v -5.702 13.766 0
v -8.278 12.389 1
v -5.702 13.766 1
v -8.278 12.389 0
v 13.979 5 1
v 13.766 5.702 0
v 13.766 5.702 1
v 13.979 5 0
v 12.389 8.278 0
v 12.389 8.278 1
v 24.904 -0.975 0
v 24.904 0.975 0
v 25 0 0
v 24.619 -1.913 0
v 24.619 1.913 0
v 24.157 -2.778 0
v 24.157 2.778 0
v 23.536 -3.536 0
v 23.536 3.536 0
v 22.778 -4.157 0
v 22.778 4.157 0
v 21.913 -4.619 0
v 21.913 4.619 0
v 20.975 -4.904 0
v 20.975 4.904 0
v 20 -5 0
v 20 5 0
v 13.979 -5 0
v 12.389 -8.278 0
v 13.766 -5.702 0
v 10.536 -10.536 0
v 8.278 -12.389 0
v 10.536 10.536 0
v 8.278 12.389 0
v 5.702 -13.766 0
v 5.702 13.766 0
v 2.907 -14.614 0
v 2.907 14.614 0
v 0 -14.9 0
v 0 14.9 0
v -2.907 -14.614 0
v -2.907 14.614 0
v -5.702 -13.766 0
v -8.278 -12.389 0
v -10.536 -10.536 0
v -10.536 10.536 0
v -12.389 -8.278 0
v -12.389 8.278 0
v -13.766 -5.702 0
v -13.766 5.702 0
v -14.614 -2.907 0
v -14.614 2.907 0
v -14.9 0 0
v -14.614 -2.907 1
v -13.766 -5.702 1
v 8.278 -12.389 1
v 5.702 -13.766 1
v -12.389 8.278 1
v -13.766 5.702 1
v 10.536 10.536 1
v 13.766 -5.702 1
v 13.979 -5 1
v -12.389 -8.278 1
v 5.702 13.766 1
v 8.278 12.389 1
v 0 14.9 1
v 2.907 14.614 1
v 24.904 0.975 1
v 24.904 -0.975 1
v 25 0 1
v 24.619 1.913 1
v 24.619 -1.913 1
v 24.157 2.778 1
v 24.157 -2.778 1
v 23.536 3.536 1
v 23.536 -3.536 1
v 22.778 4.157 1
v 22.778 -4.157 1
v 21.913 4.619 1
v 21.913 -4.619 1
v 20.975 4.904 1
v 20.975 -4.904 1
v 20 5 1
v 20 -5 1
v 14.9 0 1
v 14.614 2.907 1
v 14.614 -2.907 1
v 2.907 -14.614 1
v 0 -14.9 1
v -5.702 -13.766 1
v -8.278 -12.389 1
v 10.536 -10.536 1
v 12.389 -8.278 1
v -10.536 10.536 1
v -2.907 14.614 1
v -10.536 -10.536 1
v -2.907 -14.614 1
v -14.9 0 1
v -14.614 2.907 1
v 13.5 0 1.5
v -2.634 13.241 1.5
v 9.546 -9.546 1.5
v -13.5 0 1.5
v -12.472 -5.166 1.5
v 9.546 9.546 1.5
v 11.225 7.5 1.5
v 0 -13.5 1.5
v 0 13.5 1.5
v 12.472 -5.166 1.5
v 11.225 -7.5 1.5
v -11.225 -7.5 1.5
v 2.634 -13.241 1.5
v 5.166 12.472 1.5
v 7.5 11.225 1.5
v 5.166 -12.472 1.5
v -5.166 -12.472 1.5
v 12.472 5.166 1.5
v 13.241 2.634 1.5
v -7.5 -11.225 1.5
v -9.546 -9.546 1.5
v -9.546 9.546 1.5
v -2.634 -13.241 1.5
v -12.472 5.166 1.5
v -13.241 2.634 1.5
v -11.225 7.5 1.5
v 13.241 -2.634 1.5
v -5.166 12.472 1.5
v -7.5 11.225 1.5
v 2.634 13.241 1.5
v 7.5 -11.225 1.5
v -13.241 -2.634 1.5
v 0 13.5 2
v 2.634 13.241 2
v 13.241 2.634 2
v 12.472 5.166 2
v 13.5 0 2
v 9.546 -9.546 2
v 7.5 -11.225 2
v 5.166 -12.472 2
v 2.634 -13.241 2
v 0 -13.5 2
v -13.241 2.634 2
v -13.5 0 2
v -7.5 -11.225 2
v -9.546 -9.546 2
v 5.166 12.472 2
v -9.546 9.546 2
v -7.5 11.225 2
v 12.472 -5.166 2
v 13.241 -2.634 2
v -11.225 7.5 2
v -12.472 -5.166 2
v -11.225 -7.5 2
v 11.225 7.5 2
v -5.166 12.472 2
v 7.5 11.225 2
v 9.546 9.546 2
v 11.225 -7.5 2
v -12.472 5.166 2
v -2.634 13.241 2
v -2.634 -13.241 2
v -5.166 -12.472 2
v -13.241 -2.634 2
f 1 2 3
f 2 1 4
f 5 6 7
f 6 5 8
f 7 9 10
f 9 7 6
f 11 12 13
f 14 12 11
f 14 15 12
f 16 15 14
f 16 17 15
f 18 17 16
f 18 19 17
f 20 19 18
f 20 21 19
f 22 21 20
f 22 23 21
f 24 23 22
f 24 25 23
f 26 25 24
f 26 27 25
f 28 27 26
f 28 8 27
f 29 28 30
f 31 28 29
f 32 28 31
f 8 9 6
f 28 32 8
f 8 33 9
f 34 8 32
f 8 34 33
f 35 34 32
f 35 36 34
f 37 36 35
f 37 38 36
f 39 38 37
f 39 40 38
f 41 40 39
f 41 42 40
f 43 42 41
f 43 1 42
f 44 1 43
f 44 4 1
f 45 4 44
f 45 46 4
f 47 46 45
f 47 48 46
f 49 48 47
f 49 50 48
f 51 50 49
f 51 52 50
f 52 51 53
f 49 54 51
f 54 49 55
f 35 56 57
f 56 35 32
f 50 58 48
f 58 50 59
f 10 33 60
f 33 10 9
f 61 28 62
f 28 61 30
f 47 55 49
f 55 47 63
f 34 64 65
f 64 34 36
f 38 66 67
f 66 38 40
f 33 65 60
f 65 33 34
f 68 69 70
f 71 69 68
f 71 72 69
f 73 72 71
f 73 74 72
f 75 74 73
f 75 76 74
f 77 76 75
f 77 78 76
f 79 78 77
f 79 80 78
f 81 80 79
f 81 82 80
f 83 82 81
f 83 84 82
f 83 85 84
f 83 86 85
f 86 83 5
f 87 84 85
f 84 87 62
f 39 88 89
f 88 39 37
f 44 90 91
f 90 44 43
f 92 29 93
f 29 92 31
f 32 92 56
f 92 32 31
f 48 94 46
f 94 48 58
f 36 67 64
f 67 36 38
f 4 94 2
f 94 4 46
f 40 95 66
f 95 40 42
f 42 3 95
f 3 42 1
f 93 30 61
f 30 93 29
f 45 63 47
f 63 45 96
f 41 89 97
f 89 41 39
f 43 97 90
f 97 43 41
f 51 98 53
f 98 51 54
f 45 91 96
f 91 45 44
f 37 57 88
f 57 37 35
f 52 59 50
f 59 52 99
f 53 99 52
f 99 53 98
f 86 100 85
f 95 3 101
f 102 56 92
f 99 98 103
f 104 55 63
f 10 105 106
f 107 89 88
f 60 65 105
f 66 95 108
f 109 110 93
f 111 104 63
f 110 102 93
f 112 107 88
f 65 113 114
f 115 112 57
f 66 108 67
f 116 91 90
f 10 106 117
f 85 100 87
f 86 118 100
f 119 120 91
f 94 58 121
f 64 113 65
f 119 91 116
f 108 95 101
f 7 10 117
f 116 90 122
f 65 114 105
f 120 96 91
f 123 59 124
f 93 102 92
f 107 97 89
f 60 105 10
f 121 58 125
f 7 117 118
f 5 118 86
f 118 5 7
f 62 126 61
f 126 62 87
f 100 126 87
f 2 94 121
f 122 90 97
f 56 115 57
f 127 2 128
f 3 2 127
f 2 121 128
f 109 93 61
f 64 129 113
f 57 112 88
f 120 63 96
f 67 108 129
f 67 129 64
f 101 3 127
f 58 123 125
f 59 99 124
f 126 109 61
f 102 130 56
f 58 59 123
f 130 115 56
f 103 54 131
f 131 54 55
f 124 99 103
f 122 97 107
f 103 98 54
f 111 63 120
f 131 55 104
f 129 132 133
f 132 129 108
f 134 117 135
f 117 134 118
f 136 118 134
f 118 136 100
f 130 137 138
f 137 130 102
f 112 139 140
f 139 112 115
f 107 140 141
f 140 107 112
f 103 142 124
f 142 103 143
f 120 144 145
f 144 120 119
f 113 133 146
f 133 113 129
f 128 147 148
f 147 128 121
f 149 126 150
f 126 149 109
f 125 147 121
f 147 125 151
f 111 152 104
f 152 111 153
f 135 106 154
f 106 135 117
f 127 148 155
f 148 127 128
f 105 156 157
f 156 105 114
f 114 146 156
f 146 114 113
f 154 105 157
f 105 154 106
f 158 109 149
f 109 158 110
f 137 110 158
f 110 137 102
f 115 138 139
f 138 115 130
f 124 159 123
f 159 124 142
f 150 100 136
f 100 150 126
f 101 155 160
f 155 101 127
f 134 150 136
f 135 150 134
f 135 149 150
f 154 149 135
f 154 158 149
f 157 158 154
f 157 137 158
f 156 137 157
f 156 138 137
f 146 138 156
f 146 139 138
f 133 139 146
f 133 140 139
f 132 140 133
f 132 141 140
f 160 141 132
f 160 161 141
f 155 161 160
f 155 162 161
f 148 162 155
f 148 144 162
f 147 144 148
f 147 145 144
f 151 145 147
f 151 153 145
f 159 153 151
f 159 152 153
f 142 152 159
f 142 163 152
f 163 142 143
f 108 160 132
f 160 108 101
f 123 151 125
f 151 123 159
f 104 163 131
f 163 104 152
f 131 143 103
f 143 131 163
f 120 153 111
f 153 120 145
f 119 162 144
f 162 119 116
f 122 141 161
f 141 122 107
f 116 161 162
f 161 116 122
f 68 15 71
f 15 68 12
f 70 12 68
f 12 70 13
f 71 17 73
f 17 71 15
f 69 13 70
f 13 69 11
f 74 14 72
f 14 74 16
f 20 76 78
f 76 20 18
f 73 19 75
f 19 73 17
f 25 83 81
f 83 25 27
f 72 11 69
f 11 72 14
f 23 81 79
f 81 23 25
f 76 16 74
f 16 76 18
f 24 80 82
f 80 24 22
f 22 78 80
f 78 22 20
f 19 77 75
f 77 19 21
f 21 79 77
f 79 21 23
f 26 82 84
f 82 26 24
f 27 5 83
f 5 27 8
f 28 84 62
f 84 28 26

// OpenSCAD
// Ikea led torch pinhole projector disk generator
// 2018/10/07
// Author: crashdebug
// Thingiverse link: https://www.thingiverse.com/thing:3142042
// Licensed under the Creative Commons - Attribution - Non-Commercial - 
// Share Alike license. 
//


// Maximum 100x100 image, should be white on black for best results
image_file = "image-surface.dat"; // [image_surface:100x100]
//image_file = "KnightHead.png";
//image_file = "snail_small_linear.png";

image_width = 20; // [1:30]
image_height = 20; // [1:30]

/* [Advanced] */

// set to true to check alignment of image with disk
debug_view = "false"; // [true, false]

// moves the image surface up/down
image_z_offset = -5; // [-20:20]
// adjusts the depth of the image surface
image_z_depth = 20;    // [1:20]

// customizer generates the surface in a strange way, default offset
// should be -15 when not using customizer.

// importing stl is not possible in thingiverse customizer
// import("disk_blank.stl", convexity=3);
module disk_blank()
{
    union() {
        cylinder(r1=14.9, r2=14.9, h=1, $fn=32);
        translate([0,0,1])
            cylinder(r1=14.9, r2=13.5, h=0.5, $fn=32);
        translate([0,0,1.5])
            cylinder(r1=13.5, r2=13.5, h=0.5, $fn=32);
        translate([20,0,0])
            cylinder(r1=5, r2=5, h=1, $fn=32);
        translate([10,-5,0])
            cube([10,10,1]);
    }
}

module image_surface_positioned()
{
    translate([0,0,image_z_offset])
            resize(newsize=[image_width,image_height,image_z_depth])
                surface(file = image_file, center = true);
}

module generate_disk()
{
    if ( debug_view == "false" ) {
        difference() {
            disk_blank();
            image_surface_positioned();
        }
    } else {
        union() {
            disk_blank();
            image_surface_positioned();
        }
    }
}

generate_disk();
